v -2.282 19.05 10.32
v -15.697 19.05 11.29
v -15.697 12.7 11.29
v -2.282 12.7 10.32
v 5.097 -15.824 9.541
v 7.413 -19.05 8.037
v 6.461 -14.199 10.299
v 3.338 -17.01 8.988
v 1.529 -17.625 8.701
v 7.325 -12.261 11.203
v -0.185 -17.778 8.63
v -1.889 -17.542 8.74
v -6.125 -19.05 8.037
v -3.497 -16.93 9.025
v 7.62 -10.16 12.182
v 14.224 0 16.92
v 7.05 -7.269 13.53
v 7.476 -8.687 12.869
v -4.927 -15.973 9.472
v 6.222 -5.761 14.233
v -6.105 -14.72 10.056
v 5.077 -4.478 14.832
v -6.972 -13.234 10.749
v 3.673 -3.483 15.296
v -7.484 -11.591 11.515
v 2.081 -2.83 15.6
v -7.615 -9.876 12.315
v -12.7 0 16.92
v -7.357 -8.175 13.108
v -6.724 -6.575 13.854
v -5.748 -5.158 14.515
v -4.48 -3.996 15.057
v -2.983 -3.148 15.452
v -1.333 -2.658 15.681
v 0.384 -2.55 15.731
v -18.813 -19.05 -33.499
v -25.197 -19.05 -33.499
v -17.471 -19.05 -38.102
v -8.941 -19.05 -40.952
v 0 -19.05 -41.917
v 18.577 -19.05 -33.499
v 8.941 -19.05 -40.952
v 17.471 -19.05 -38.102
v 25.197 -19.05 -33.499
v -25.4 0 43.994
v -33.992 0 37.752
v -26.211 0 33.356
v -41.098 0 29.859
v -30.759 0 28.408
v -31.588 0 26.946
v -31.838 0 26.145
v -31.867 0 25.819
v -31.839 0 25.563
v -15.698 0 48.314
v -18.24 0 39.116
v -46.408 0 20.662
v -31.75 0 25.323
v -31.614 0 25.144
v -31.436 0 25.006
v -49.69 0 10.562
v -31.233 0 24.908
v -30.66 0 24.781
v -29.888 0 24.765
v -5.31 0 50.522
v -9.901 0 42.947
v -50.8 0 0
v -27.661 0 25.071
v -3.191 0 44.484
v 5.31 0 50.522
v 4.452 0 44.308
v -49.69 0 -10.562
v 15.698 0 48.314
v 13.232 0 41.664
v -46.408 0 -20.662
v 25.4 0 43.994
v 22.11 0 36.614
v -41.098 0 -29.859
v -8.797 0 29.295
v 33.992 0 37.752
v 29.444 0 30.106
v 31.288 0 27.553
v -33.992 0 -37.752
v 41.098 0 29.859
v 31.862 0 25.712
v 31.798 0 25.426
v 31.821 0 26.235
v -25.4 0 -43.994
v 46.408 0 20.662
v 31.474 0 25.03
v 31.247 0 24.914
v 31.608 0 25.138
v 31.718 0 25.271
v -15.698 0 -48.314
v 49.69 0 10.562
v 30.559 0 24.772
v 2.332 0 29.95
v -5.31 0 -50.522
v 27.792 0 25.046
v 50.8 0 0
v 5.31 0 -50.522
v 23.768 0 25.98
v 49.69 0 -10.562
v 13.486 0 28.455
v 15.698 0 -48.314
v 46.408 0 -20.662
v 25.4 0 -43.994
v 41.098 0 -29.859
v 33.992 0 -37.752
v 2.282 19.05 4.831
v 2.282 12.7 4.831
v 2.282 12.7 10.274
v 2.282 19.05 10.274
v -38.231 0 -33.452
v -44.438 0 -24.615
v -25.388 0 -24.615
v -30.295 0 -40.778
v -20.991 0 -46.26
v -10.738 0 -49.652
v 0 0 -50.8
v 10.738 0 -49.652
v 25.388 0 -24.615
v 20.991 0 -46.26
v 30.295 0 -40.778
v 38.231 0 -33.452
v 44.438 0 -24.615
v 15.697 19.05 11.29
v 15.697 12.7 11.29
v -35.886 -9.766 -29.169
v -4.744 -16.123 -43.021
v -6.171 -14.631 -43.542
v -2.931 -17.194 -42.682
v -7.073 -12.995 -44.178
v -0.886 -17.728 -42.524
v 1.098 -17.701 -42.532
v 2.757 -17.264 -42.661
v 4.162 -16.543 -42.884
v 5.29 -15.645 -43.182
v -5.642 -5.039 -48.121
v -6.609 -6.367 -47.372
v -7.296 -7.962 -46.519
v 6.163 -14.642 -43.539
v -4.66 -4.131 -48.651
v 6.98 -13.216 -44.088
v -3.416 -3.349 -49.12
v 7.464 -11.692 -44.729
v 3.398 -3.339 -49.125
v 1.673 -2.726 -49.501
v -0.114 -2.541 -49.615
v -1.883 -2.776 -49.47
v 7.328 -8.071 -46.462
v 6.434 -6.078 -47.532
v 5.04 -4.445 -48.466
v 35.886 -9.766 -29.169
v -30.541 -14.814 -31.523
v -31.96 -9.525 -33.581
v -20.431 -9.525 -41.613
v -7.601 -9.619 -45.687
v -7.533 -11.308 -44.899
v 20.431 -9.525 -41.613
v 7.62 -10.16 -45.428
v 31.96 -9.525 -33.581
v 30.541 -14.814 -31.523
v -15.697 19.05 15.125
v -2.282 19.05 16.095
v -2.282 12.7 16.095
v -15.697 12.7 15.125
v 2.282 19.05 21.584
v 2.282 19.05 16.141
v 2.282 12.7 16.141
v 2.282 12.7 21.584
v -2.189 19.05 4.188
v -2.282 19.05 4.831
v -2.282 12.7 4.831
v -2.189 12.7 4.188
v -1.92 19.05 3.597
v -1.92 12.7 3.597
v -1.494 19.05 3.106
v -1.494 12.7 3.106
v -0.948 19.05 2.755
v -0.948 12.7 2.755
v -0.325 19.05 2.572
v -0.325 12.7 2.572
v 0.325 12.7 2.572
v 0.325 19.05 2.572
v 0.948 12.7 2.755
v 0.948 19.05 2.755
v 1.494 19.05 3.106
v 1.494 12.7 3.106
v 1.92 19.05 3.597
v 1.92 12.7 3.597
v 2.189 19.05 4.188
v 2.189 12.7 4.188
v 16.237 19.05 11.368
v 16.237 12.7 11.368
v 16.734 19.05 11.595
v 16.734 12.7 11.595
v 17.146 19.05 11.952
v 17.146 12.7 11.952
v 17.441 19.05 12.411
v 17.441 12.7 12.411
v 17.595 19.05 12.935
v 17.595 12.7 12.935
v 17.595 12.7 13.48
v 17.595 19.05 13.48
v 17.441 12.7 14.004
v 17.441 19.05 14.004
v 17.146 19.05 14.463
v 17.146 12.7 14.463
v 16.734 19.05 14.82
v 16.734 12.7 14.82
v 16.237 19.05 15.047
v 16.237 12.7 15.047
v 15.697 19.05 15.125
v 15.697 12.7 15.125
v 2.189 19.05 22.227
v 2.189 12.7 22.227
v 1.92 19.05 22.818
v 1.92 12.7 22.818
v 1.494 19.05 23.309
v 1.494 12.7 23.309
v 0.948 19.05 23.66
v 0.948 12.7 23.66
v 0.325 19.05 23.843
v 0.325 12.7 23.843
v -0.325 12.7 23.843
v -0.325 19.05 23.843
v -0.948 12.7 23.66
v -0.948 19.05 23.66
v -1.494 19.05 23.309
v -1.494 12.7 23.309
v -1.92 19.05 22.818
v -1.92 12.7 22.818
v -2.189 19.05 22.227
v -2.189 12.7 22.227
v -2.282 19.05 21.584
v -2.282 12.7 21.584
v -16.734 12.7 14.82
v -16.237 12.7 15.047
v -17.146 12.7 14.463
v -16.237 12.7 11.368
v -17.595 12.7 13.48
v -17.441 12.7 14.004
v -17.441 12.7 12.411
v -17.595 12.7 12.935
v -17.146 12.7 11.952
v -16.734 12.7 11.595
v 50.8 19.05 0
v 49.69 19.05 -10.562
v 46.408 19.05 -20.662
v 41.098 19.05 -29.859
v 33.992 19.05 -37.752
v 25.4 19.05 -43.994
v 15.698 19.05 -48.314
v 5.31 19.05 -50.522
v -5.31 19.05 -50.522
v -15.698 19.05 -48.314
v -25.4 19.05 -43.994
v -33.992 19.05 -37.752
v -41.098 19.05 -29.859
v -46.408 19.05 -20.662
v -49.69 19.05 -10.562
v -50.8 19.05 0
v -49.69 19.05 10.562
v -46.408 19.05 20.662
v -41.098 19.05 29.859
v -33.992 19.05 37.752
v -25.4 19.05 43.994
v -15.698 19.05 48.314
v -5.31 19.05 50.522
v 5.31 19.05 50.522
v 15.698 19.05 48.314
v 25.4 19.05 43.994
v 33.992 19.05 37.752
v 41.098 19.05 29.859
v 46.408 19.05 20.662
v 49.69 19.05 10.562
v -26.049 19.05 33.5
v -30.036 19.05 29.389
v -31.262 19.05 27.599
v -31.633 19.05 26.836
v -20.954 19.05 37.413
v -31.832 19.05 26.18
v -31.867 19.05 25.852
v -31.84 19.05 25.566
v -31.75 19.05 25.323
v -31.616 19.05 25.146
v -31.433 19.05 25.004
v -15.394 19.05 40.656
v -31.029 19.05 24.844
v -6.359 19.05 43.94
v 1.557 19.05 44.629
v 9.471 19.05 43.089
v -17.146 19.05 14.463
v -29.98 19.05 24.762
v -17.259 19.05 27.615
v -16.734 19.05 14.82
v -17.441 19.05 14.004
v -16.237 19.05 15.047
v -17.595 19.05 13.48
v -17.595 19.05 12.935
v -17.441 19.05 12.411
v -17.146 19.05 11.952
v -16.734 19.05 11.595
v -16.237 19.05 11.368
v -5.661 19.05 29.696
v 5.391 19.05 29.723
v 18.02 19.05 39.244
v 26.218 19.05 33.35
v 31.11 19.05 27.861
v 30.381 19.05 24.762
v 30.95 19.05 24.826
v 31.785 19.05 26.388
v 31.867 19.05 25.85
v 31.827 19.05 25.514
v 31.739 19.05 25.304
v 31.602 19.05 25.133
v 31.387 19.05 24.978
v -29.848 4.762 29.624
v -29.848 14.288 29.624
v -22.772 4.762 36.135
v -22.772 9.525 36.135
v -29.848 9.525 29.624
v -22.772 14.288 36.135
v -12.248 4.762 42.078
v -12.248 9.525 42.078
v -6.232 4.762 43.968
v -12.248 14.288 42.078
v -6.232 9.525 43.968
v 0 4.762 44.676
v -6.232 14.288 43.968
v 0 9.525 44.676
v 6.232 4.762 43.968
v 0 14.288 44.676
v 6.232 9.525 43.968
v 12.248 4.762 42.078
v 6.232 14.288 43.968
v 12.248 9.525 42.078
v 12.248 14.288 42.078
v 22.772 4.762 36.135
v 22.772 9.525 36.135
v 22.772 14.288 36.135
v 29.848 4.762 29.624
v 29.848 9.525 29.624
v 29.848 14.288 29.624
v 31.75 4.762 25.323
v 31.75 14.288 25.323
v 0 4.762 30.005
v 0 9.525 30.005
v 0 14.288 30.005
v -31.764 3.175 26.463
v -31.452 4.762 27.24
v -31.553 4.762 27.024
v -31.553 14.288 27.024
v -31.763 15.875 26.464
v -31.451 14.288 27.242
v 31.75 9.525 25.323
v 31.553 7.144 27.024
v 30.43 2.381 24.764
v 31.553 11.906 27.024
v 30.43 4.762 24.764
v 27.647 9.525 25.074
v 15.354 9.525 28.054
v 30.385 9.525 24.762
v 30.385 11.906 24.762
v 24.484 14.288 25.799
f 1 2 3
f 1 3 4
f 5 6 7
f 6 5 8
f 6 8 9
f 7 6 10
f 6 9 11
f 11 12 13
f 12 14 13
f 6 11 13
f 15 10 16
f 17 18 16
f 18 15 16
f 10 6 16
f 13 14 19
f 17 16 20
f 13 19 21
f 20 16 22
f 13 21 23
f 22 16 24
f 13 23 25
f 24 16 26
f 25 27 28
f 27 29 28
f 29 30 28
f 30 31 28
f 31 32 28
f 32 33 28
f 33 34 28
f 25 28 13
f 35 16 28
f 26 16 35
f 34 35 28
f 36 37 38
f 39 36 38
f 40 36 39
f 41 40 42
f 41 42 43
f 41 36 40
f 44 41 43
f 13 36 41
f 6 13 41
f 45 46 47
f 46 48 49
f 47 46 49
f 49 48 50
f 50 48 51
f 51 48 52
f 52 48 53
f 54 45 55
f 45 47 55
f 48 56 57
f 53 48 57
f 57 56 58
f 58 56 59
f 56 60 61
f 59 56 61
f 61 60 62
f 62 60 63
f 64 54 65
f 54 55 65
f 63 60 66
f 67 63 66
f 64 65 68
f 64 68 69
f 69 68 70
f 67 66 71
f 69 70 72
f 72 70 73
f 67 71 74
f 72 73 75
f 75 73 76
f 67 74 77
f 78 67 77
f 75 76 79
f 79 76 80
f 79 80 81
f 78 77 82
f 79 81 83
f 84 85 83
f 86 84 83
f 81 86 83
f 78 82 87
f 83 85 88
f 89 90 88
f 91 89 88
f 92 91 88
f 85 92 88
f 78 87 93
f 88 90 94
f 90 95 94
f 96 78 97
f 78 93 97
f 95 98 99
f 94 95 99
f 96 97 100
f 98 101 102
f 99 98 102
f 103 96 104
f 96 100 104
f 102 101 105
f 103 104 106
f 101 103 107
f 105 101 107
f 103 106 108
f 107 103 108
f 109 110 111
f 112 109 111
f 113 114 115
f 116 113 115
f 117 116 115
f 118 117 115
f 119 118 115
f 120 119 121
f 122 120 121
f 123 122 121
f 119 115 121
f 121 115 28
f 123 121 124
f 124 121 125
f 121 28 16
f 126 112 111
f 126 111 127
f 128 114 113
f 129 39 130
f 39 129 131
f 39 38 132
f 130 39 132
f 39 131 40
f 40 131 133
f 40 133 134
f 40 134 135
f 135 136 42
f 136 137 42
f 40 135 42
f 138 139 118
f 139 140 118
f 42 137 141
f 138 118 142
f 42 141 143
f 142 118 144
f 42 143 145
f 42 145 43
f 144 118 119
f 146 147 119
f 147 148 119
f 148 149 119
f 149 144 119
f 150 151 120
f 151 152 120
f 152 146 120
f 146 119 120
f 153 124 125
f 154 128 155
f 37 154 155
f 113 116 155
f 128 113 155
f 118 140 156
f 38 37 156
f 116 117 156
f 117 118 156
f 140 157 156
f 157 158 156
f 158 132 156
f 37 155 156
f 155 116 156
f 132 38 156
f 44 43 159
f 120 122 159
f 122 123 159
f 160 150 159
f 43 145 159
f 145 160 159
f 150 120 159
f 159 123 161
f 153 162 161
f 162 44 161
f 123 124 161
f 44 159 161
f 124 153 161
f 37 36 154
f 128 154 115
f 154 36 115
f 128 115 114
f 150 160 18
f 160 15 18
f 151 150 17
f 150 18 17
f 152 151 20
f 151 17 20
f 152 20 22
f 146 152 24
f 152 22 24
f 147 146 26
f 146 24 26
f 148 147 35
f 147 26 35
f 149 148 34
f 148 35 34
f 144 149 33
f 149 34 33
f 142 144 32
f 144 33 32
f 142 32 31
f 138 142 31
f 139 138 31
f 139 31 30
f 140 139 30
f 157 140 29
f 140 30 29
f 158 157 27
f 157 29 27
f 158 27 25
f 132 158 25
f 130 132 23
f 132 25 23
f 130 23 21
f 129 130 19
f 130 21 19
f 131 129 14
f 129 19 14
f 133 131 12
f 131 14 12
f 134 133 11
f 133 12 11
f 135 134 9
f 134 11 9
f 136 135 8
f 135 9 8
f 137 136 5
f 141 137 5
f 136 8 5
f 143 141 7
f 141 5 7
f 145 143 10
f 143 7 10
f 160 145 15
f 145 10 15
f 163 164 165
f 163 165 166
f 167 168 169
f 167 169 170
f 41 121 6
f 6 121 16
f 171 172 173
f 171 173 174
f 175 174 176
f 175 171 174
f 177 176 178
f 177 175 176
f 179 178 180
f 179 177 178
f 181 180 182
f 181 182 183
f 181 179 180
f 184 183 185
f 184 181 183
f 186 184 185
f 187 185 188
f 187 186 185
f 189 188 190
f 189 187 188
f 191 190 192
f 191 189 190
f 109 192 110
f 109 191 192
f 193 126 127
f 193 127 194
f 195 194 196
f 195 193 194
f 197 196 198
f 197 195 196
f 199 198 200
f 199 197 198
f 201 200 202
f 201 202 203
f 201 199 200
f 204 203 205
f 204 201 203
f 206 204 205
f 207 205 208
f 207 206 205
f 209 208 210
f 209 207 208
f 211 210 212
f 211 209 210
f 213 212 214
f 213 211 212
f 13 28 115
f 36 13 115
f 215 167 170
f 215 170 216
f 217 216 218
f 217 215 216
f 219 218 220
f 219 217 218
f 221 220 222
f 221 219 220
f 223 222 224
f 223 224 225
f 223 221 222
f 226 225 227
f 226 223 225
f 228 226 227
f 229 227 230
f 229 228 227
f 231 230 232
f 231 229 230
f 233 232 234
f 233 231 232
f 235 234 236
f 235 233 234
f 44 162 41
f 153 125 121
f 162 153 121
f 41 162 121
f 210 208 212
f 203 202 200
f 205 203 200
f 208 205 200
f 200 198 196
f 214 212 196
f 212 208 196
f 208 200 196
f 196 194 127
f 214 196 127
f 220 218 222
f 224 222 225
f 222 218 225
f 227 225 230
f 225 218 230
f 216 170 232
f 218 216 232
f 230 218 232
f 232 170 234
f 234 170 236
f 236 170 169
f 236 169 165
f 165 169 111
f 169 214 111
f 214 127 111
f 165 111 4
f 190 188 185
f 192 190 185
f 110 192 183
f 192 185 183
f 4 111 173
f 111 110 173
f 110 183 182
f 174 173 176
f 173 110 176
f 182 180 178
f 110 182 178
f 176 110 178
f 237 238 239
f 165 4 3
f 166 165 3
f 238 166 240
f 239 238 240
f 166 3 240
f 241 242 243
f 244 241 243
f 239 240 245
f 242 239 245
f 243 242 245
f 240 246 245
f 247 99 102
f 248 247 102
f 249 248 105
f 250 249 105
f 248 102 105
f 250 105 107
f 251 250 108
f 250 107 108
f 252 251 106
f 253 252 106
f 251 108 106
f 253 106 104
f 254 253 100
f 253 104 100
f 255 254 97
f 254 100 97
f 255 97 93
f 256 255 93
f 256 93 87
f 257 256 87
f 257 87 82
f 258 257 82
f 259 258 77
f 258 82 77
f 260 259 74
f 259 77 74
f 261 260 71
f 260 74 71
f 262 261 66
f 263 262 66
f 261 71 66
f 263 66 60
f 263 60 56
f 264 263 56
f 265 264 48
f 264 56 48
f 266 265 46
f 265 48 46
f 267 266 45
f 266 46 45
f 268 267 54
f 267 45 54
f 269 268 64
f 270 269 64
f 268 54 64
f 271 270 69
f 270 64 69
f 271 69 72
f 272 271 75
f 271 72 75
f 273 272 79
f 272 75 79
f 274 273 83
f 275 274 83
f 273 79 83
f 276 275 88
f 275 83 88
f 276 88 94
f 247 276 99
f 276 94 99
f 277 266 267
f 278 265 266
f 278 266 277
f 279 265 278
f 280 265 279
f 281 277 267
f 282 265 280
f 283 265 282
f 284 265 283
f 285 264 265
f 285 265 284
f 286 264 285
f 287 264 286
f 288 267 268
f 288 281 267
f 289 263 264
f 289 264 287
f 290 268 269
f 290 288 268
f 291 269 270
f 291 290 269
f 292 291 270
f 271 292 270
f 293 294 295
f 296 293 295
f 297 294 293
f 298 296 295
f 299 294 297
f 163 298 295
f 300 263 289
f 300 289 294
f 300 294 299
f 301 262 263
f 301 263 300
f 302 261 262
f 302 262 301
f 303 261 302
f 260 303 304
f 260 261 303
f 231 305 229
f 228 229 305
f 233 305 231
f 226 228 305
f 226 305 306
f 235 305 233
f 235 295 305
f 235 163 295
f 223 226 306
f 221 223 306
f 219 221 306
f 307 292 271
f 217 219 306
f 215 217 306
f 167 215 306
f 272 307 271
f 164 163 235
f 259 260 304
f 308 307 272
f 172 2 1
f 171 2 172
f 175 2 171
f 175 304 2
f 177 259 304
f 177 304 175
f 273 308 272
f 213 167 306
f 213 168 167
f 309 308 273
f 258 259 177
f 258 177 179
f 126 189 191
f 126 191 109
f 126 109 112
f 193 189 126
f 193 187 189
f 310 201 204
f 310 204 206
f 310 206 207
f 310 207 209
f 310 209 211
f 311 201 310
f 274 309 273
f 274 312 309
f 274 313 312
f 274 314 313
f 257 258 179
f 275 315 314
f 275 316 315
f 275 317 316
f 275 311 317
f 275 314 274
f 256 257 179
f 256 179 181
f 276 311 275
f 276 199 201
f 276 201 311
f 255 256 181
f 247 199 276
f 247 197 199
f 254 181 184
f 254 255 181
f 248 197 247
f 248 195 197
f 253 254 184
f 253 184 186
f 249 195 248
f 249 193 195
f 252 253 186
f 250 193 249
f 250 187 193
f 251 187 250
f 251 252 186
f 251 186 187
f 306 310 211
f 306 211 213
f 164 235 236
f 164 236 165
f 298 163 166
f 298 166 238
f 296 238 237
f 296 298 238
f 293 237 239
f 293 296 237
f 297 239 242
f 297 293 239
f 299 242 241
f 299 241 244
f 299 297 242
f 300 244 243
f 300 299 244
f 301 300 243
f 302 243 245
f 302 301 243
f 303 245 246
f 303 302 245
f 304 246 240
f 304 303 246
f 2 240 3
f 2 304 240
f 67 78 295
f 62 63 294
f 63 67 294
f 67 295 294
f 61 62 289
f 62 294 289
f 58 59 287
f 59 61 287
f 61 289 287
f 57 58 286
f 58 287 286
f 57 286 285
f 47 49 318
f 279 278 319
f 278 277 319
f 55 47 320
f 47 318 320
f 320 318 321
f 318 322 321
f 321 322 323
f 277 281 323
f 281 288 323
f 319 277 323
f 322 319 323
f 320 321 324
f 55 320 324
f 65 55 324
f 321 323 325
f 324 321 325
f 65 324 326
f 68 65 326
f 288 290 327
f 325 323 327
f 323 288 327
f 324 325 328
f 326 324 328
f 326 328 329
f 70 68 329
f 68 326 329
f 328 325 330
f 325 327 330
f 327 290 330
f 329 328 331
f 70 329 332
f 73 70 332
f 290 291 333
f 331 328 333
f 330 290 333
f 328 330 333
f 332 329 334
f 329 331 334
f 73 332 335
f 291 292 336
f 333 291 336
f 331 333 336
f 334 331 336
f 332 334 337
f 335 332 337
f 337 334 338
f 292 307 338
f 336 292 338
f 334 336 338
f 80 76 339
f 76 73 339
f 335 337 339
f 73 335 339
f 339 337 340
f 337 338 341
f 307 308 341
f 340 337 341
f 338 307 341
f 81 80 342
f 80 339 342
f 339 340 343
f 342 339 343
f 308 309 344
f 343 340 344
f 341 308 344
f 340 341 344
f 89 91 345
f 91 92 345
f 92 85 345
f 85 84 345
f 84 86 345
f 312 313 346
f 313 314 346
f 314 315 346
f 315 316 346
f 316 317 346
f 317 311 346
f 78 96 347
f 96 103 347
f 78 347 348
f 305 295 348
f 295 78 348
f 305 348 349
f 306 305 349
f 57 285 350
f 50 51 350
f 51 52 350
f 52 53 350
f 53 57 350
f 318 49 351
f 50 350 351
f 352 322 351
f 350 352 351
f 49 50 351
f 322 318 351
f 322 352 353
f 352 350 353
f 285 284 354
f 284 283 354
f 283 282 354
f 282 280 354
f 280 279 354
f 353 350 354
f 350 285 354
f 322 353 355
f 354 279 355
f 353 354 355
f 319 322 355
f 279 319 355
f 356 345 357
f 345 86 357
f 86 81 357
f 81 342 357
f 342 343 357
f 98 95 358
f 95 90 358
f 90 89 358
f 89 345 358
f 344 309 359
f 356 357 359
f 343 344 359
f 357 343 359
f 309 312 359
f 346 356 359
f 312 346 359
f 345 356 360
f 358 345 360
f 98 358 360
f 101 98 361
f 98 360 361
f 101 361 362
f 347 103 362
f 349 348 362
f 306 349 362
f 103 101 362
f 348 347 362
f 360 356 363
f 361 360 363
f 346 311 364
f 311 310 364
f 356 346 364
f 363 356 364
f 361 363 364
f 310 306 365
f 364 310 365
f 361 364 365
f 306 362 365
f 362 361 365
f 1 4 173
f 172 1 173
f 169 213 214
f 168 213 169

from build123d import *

# Parameters (mm, degrees)
SKETCH1_R               = 50.8
BOSS_EXTRUDE1_DEPTH     = 19.05
CUT_EXTRUDE1_DEPTH      = 6.35
CUT_EXTRUDE2_DEPTH      = 20.05
BOSS_EXTRUDE2_DEPTH     = 19.05
BOSS_EXTRUDE2_DRAFT     = 25
SKETCH6_R               = 7.62
CUT_EXTRUDE3_DEPTH      = 51.8000001
CUT_EXTRUDE3_DEPTH_BACK = 51.8000001


with BuildPart() as part:
    # Sketch1 → Boss-Extrude1 (new body)
    with BuildSketch(Plane(origin=(0, 0, 0), x_dir=(1, 0, 0), z_dir=(0, 1, 0))):
        Circle(SKETCH1_R)
    extrude(amount=BOSS_EXTRUDE1_DEPTH)

    # Sketch2 → Cut-Extrude1 (cut)
    with BuildSketch(Plane(origin=(0, 19.05, 0), x_dir=(1, 0, 0), z_dir=(0, 1, 0))):
        with BuildLine():
            Line((-15.6972, -11.290296429), (-2.281933688, -10.319915476))
            Line((-2.281933688, -10.319915476), (-2.281933688, -4.830552162))
            ThreePointArc((-2.281933688, -4.830552162), (0, -2.548618474), (2.281933688, -4.830552162))
            Line((2.281933688, -4.830552162), (2.281933688, -10.27350561))
            Line((2.281933688, -10.27350561), (15.6972, -11.290296429))
            ThreePointArc((15.6972, -11.290296429), (17.614394741, -13.20749117), (15.6972, -15.124685911))
            Line((15.6972, -15.124685911), (2.281933688, -16.141476731))
            Line((2.281933688, -16.141476731), (2.281933688, -21.584430178))
            ThreePointArc((2.281933688, -21.584430178), (0, -23.866363866), (-2.281933688, -21.584430178))
            Line((-2.281933688, -21.584430178), (-2.281933688, -16.095066864))
            Line((-2.281933688, -16.095066864), (-15.6972, -15.124685911))
            ThreePointArc((-15.6972, -15.124685911), (-17.614394741, -13.20749117), (-15.6972, -11.290296429))
        make_face()
    extrude(amount=-CUT_EXTRUDE1_DEPTH, mode=Mode.SUBTRACT)

    # Sketch3 → Cut-Extrude2 (cut, through all)
    with BuildSketch(Plane(origin=(0, 19.05, 0), x_dir=(1, 0, 0), z_dir=(0, 1, 0))):
        with BuildLine():
            add(Edge.make_bspline(
                [(-31.75, -25.323325498), (-33.428426621, -28.350329476), (0, -61.001077706), (47.854748089, -14.259621723), (0, -37.299148342), (-30.301321469, -22.710666938), (-31.75, -25.323325498)],
                knots=[0, 0, 0, 0, 0.268367474, 0.536734948, 0.768367474, 1, 1, 1, 1], degree=3))
        make_face()
    extrude(amount=-CUT_EXTRUDE2_DEPTH, mode=Mode.SUBTRACT)


with BuildPart() as body_2:
    # Sketch4 → Boss-Extrude2 (with draft: the straight prism first)
    with BuildSketch(Plane.XZ):
        with BuildLine():
            ThreePointArc((-44.437877263, -24.615342053), (0, -50.8), (44.437877263, -24.615342053))
            Line((44.437877263, -24.615342053), (25.387877263, -24.615342053))
            Line((25.387877263, -24.615342053), (14.224, 16.919953551))
            Line((14.224, 16.919953551), (-12.7, 16.919953551))
            Line((-12.7, 16.919953551), (-25.387877263, -24.615342053))
            Line((-25.387877263, -24.615342053), (-44.437877263, -24.615342053))
        make_face()
    extrude(amount=BOSS_EXTRUDE2_DEPTH)
    # Boss-Extrude2: the draft: its side faces are tilted about the plane it starts from
    boss_extrude2_sides = [body_2.faces().sort_by_distance(p)[0] for p in [
        (0, -9.525, -50.8),
        (34.912877263, -9.525, -24.615342053),
        (19.805938631, -9.525, -3.847694251),
        (0.762, -9.525, 16.919953551),
        (-19.043938631, -9.525, -3.847694251),
        (-34.912877263, -9.525, -24.615342053),
    ]]
    draft(boss_extrude2_sides, Plane.XZ, BOSS_EXTRUDE2_DRAFT)

    # Sketch6 → Cut-Extrude3 (cut, two sides)
    with BuildSketch(Plane.XY) as cut_extrude3_sk:
        with Locations((0, -10.16)):
            Circle(SKETCH6_R)
    extrude(amount=CUT_EXTRUDE3_DEPTH, mode=Mode.SUBTRACT)
    extrude(cut_extrude3_sk.sketch, amount=-CUT_EXTRUDE3_DEPTH_BACK, mode=Mode.SUBTRACT)


solid = Compound([part.part, body_2.part])
